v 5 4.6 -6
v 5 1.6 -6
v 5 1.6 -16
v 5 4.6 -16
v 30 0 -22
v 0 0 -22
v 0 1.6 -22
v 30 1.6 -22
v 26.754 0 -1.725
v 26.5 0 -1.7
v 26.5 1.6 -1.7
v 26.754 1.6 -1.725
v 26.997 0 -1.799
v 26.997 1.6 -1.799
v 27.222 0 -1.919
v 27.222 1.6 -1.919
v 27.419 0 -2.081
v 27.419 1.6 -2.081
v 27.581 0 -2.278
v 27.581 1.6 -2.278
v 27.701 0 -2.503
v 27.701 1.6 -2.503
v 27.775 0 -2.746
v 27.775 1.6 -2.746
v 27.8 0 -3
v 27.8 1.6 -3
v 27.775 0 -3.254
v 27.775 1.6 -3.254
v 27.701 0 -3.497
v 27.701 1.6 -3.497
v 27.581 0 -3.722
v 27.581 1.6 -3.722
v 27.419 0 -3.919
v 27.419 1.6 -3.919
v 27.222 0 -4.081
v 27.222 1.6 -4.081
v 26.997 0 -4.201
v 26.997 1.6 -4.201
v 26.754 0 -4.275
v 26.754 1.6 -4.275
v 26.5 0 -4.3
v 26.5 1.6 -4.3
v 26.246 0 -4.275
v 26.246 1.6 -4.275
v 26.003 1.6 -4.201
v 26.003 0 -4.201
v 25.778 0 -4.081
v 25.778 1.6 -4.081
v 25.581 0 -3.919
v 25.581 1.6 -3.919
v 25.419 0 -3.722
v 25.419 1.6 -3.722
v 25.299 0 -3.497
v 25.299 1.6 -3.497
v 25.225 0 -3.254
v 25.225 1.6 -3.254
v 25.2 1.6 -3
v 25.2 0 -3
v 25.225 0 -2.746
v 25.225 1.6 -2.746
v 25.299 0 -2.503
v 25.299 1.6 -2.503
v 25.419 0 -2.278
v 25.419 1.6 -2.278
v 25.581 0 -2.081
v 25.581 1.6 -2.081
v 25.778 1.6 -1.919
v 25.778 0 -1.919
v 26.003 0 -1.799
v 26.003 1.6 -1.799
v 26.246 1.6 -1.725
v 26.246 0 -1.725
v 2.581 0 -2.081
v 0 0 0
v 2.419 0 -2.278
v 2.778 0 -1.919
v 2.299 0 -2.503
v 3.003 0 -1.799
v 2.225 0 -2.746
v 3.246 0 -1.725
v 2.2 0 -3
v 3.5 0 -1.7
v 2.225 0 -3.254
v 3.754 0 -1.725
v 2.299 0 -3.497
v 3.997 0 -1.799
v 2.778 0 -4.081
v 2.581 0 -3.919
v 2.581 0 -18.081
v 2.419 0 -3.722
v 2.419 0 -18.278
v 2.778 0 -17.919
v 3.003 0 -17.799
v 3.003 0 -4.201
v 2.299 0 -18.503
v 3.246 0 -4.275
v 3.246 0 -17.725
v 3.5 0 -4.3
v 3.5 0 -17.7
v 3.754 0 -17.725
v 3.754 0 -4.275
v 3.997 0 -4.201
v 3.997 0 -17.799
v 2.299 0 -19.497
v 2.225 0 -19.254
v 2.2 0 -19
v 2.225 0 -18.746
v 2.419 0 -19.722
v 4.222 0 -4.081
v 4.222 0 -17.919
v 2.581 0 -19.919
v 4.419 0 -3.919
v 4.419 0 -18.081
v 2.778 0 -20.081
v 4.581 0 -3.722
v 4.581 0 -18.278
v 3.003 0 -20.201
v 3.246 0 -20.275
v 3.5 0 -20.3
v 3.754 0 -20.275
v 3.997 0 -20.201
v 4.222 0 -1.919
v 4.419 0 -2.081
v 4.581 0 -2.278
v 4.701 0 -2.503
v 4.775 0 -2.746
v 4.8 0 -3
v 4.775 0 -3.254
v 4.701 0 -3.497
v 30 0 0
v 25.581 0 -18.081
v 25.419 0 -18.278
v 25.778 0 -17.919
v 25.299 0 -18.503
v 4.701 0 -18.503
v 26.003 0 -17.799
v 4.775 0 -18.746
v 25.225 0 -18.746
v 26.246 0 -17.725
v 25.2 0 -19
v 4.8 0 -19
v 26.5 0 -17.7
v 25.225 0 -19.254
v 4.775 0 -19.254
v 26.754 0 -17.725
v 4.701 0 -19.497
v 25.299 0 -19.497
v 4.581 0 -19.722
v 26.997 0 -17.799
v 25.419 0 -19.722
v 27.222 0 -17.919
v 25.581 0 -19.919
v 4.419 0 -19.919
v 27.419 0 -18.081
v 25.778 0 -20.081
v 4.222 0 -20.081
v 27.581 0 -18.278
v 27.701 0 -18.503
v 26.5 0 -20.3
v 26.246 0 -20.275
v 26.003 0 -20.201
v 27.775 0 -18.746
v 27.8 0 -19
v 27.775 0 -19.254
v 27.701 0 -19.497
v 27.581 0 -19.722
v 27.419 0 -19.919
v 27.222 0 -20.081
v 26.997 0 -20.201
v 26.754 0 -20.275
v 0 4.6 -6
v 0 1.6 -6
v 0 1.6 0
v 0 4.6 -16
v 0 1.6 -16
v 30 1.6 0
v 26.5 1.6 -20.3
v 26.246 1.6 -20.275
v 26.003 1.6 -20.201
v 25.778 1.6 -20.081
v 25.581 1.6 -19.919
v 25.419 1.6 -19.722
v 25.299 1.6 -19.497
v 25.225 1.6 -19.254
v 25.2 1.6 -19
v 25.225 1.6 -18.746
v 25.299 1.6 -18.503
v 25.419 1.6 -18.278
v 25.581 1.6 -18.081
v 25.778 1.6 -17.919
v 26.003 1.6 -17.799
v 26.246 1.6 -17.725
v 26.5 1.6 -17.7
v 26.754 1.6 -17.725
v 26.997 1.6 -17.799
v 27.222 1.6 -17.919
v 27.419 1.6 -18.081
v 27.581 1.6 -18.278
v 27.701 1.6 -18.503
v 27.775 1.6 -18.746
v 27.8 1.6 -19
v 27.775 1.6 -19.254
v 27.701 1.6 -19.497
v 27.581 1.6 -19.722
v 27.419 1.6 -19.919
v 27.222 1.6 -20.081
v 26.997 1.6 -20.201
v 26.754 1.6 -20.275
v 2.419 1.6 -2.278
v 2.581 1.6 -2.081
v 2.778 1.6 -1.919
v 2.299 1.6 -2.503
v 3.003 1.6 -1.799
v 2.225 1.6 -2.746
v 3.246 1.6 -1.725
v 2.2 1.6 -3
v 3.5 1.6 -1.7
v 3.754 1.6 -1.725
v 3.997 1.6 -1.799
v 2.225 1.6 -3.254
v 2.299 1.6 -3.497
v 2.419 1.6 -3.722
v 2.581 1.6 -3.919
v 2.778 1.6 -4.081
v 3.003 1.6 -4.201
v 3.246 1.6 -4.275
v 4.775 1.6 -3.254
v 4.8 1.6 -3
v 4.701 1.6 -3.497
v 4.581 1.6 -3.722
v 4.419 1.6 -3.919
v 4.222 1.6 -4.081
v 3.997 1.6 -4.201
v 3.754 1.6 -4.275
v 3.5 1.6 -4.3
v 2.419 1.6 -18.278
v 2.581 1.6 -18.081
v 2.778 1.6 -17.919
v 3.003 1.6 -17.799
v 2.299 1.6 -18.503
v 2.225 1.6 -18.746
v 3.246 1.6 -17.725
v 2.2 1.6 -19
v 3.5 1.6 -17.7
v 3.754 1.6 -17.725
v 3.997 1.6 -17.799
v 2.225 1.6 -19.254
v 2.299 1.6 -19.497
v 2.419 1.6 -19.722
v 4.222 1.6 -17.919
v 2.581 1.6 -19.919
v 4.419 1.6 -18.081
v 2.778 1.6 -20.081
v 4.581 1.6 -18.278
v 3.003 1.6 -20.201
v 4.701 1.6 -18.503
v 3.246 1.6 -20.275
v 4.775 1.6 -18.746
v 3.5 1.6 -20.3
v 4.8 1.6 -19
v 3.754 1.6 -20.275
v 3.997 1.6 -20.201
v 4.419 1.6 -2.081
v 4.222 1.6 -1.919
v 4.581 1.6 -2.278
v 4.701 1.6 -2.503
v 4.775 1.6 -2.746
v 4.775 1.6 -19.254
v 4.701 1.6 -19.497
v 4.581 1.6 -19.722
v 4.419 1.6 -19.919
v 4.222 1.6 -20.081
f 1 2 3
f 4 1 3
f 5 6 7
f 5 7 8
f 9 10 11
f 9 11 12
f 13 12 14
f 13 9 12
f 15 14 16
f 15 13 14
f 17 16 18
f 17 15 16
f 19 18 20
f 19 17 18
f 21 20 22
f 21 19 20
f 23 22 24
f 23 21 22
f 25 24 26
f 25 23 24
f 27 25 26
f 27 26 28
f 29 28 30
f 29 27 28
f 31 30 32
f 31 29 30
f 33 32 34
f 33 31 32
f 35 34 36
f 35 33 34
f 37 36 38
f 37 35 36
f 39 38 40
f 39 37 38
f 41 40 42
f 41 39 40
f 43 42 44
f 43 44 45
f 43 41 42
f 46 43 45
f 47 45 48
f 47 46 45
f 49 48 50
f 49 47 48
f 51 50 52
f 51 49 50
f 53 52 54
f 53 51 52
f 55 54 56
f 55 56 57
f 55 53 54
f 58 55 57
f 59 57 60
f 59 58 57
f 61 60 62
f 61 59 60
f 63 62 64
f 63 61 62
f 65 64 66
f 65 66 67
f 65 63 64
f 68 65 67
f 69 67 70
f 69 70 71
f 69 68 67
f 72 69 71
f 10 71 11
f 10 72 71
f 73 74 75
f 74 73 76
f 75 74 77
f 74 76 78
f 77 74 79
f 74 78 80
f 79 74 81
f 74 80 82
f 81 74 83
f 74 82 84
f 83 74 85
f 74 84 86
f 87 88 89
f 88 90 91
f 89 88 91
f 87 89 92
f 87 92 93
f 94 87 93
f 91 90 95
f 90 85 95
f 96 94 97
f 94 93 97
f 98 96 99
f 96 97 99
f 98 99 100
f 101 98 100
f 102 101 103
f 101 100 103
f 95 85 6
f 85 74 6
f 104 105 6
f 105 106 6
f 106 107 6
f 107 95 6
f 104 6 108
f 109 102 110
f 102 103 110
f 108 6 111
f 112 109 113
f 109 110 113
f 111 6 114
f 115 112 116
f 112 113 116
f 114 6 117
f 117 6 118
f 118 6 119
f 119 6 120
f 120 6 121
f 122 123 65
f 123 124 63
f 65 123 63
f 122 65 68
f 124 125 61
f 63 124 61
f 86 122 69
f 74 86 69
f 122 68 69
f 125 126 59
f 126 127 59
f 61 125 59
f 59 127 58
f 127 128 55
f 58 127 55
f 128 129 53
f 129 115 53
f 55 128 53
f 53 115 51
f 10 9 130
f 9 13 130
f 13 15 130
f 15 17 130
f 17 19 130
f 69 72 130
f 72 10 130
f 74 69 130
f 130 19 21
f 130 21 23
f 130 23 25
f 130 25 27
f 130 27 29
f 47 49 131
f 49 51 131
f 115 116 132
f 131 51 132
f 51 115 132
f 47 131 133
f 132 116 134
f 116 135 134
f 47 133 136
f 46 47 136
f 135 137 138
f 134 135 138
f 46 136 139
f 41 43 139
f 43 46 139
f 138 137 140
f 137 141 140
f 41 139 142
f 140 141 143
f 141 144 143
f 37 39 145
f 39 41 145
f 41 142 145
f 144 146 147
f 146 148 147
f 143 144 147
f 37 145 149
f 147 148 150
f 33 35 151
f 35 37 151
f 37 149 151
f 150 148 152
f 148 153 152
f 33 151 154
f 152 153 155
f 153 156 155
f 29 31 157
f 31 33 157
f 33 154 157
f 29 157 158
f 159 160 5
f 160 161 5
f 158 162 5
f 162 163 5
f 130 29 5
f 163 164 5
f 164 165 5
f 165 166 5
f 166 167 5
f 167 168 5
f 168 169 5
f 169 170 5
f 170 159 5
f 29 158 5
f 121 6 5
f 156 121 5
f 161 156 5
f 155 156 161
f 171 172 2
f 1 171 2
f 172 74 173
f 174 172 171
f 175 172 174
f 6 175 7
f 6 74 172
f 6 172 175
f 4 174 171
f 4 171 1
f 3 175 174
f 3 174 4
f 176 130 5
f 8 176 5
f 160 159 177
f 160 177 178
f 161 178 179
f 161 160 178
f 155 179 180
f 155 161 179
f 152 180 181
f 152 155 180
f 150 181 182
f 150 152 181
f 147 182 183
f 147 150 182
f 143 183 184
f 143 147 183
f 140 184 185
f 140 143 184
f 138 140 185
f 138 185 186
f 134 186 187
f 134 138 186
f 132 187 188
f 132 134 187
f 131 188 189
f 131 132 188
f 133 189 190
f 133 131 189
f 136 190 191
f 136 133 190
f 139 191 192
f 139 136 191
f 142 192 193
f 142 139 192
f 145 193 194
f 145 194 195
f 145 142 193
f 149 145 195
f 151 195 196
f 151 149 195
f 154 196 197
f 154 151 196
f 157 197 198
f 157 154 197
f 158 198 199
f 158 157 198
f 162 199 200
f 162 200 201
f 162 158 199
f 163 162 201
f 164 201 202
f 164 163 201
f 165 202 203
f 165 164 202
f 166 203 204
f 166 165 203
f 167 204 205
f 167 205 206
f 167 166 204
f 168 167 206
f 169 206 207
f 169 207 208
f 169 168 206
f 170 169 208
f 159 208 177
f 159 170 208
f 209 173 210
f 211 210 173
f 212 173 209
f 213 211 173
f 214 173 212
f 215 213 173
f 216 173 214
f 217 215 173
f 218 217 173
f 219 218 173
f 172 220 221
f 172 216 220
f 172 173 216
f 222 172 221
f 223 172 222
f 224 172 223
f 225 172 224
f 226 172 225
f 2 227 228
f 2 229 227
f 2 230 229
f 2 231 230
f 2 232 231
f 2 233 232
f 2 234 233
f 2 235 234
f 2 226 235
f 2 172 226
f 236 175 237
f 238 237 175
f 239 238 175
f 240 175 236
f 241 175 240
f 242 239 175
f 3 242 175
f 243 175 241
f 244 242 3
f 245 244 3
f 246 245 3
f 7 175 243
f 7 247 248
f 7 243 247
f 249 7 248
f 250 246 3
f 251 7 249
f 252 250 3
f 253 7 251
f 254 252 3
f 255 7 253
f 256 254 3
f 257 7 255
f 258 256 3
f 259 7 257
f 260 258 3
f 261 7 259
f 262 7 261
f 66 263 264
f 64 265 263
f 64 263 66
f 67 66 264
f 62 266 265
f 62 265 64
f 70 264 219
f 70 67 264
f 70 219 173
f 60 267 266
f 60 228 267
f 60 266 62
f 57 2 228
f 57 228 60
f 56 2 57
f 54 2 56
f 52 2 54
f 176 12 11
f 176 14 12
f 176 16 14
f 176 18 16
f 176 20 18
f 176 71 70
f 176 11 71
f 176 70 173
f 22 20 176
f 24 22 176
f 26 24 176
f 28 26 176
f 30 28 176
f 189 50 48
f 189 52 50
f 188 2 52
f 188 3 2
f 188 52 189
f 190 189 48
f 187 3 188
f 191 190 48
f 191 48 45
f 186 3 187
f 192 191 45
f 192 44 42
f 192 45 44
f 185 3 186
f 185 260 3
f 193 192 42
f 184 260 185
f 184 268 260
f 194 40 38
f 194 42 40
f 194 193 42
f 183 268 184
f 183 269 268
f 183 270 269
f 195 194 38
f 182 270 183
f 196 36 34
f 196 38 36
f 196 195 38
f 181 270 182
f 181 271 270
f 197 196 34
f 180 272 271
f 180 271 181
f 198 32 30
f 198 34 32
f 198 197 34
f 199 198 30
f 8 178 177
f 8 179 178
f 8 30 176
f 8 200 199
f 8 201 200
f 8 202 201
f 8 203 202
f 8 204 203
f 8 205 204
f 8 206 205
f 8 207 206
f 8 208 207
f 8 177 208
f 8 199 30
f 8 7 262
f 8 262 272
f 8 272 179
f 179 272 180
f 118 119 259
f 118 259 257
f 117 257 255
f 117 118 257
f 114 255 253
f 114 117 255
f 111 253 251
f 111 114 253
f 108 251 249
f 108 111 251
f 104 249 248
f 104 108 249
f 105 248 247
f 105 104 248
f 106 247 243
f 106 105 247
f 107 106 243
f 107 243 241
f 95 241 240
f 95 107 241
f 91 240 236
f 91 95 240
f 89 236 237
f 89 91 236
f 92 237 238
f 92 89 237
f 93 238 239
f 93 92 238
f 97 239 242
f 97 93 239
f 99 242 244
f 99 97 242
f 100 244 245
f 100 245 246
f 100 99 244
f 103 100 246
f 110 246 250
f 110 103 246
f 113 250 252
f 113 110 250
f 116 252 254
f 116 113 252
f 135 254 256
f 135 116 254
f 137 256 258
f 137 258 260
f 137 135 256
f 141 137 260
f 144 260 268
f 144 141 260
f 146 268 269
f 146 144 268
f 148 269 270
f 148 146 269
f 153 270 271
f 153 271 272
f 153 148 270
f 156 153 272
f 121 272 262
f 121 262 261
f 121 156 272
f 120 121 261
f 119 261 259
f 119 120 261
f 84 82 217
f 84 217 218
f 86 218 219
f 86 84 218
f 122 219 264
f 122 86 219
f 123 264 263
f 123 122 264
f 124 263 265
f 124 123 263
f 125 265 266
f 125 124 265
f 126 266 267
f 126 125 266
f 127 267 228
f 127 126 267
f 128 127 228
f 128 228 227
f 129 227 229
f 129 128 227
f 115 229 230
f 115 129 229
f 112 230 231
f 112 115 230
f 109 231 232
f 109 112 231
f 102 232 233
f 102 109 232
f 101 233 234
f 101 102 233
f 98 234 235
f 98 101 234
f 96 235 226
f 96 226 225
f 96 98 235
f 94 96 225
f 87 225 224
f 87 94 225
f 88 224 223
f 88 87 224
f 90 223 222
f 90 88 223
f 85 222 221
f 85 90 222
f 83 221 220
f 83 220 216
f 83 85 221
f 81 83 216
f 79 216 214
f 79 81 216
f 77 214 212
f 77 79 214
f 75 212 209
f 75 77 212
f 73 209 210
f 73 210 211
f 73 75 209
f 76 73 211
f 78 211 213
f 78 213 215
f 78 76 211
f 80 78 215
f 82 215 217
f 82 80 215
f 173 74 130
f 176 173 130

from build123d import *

# Parameters (mm, degrees)
SKETCH_1_W      = 30
SKETCH_1_H      = 22
SKETCH_1_R      = 1.3
EXTRUDE_1_DEPTH = 1.6
SKETCH_2_W      = 5
SKETCH_2_H      = 10
EXTRUDE_2_DEPTH = 3


with BuildPart() as part:
    # 草图1 → 凸台-拉伸1 (new body)
    with BuildSketch(Plane(origin=(0, 0, 0), x_dir=(1, 0, 0), z_dir=(0, 1, 0))):
        with Locations((15, 11)):
            Rectangle(SKETCH_1_W, SKETCH_1_H)
        with Locations(Location((3.5, 3, 0), (0, 0, 270))):
            Circle(SKETCH_1_R, mode=Mode.SUBTRACT)
        with Locations(Location((26.5, 3, 0), (0, 0, 270))):
            Circle(SKETCH_1_R, mode=Mode.SUBTRACT)
        with Locations(Location((26.5, 19, 0), (0, 0, 90))):
            Circle(SKETCH_1_R, mode=Mode.SUBTRACT)
        with Locations(Location((3.5, 19, 0), (0, 0, 90))):
            Circle(SKETCH_1_R, mode=Mode.SUBTRACT)
    extrude(amount=EXTRUDE_1_DEPTH)

    # 草图2 → 凸台-拉伸2 (add)
    with BuildSketch(Plane(origin=(0, 1.6, 0), x_dir=(1, 0, 0), z_dir=(0, 1, 0))):
        with Locations((2.5, 11)):
            Rectangle(SKETCH_2_W, SKETCH_2_H)
    extrude(amount=EXTRUDE_2_DEPTH)


solid = part.part
